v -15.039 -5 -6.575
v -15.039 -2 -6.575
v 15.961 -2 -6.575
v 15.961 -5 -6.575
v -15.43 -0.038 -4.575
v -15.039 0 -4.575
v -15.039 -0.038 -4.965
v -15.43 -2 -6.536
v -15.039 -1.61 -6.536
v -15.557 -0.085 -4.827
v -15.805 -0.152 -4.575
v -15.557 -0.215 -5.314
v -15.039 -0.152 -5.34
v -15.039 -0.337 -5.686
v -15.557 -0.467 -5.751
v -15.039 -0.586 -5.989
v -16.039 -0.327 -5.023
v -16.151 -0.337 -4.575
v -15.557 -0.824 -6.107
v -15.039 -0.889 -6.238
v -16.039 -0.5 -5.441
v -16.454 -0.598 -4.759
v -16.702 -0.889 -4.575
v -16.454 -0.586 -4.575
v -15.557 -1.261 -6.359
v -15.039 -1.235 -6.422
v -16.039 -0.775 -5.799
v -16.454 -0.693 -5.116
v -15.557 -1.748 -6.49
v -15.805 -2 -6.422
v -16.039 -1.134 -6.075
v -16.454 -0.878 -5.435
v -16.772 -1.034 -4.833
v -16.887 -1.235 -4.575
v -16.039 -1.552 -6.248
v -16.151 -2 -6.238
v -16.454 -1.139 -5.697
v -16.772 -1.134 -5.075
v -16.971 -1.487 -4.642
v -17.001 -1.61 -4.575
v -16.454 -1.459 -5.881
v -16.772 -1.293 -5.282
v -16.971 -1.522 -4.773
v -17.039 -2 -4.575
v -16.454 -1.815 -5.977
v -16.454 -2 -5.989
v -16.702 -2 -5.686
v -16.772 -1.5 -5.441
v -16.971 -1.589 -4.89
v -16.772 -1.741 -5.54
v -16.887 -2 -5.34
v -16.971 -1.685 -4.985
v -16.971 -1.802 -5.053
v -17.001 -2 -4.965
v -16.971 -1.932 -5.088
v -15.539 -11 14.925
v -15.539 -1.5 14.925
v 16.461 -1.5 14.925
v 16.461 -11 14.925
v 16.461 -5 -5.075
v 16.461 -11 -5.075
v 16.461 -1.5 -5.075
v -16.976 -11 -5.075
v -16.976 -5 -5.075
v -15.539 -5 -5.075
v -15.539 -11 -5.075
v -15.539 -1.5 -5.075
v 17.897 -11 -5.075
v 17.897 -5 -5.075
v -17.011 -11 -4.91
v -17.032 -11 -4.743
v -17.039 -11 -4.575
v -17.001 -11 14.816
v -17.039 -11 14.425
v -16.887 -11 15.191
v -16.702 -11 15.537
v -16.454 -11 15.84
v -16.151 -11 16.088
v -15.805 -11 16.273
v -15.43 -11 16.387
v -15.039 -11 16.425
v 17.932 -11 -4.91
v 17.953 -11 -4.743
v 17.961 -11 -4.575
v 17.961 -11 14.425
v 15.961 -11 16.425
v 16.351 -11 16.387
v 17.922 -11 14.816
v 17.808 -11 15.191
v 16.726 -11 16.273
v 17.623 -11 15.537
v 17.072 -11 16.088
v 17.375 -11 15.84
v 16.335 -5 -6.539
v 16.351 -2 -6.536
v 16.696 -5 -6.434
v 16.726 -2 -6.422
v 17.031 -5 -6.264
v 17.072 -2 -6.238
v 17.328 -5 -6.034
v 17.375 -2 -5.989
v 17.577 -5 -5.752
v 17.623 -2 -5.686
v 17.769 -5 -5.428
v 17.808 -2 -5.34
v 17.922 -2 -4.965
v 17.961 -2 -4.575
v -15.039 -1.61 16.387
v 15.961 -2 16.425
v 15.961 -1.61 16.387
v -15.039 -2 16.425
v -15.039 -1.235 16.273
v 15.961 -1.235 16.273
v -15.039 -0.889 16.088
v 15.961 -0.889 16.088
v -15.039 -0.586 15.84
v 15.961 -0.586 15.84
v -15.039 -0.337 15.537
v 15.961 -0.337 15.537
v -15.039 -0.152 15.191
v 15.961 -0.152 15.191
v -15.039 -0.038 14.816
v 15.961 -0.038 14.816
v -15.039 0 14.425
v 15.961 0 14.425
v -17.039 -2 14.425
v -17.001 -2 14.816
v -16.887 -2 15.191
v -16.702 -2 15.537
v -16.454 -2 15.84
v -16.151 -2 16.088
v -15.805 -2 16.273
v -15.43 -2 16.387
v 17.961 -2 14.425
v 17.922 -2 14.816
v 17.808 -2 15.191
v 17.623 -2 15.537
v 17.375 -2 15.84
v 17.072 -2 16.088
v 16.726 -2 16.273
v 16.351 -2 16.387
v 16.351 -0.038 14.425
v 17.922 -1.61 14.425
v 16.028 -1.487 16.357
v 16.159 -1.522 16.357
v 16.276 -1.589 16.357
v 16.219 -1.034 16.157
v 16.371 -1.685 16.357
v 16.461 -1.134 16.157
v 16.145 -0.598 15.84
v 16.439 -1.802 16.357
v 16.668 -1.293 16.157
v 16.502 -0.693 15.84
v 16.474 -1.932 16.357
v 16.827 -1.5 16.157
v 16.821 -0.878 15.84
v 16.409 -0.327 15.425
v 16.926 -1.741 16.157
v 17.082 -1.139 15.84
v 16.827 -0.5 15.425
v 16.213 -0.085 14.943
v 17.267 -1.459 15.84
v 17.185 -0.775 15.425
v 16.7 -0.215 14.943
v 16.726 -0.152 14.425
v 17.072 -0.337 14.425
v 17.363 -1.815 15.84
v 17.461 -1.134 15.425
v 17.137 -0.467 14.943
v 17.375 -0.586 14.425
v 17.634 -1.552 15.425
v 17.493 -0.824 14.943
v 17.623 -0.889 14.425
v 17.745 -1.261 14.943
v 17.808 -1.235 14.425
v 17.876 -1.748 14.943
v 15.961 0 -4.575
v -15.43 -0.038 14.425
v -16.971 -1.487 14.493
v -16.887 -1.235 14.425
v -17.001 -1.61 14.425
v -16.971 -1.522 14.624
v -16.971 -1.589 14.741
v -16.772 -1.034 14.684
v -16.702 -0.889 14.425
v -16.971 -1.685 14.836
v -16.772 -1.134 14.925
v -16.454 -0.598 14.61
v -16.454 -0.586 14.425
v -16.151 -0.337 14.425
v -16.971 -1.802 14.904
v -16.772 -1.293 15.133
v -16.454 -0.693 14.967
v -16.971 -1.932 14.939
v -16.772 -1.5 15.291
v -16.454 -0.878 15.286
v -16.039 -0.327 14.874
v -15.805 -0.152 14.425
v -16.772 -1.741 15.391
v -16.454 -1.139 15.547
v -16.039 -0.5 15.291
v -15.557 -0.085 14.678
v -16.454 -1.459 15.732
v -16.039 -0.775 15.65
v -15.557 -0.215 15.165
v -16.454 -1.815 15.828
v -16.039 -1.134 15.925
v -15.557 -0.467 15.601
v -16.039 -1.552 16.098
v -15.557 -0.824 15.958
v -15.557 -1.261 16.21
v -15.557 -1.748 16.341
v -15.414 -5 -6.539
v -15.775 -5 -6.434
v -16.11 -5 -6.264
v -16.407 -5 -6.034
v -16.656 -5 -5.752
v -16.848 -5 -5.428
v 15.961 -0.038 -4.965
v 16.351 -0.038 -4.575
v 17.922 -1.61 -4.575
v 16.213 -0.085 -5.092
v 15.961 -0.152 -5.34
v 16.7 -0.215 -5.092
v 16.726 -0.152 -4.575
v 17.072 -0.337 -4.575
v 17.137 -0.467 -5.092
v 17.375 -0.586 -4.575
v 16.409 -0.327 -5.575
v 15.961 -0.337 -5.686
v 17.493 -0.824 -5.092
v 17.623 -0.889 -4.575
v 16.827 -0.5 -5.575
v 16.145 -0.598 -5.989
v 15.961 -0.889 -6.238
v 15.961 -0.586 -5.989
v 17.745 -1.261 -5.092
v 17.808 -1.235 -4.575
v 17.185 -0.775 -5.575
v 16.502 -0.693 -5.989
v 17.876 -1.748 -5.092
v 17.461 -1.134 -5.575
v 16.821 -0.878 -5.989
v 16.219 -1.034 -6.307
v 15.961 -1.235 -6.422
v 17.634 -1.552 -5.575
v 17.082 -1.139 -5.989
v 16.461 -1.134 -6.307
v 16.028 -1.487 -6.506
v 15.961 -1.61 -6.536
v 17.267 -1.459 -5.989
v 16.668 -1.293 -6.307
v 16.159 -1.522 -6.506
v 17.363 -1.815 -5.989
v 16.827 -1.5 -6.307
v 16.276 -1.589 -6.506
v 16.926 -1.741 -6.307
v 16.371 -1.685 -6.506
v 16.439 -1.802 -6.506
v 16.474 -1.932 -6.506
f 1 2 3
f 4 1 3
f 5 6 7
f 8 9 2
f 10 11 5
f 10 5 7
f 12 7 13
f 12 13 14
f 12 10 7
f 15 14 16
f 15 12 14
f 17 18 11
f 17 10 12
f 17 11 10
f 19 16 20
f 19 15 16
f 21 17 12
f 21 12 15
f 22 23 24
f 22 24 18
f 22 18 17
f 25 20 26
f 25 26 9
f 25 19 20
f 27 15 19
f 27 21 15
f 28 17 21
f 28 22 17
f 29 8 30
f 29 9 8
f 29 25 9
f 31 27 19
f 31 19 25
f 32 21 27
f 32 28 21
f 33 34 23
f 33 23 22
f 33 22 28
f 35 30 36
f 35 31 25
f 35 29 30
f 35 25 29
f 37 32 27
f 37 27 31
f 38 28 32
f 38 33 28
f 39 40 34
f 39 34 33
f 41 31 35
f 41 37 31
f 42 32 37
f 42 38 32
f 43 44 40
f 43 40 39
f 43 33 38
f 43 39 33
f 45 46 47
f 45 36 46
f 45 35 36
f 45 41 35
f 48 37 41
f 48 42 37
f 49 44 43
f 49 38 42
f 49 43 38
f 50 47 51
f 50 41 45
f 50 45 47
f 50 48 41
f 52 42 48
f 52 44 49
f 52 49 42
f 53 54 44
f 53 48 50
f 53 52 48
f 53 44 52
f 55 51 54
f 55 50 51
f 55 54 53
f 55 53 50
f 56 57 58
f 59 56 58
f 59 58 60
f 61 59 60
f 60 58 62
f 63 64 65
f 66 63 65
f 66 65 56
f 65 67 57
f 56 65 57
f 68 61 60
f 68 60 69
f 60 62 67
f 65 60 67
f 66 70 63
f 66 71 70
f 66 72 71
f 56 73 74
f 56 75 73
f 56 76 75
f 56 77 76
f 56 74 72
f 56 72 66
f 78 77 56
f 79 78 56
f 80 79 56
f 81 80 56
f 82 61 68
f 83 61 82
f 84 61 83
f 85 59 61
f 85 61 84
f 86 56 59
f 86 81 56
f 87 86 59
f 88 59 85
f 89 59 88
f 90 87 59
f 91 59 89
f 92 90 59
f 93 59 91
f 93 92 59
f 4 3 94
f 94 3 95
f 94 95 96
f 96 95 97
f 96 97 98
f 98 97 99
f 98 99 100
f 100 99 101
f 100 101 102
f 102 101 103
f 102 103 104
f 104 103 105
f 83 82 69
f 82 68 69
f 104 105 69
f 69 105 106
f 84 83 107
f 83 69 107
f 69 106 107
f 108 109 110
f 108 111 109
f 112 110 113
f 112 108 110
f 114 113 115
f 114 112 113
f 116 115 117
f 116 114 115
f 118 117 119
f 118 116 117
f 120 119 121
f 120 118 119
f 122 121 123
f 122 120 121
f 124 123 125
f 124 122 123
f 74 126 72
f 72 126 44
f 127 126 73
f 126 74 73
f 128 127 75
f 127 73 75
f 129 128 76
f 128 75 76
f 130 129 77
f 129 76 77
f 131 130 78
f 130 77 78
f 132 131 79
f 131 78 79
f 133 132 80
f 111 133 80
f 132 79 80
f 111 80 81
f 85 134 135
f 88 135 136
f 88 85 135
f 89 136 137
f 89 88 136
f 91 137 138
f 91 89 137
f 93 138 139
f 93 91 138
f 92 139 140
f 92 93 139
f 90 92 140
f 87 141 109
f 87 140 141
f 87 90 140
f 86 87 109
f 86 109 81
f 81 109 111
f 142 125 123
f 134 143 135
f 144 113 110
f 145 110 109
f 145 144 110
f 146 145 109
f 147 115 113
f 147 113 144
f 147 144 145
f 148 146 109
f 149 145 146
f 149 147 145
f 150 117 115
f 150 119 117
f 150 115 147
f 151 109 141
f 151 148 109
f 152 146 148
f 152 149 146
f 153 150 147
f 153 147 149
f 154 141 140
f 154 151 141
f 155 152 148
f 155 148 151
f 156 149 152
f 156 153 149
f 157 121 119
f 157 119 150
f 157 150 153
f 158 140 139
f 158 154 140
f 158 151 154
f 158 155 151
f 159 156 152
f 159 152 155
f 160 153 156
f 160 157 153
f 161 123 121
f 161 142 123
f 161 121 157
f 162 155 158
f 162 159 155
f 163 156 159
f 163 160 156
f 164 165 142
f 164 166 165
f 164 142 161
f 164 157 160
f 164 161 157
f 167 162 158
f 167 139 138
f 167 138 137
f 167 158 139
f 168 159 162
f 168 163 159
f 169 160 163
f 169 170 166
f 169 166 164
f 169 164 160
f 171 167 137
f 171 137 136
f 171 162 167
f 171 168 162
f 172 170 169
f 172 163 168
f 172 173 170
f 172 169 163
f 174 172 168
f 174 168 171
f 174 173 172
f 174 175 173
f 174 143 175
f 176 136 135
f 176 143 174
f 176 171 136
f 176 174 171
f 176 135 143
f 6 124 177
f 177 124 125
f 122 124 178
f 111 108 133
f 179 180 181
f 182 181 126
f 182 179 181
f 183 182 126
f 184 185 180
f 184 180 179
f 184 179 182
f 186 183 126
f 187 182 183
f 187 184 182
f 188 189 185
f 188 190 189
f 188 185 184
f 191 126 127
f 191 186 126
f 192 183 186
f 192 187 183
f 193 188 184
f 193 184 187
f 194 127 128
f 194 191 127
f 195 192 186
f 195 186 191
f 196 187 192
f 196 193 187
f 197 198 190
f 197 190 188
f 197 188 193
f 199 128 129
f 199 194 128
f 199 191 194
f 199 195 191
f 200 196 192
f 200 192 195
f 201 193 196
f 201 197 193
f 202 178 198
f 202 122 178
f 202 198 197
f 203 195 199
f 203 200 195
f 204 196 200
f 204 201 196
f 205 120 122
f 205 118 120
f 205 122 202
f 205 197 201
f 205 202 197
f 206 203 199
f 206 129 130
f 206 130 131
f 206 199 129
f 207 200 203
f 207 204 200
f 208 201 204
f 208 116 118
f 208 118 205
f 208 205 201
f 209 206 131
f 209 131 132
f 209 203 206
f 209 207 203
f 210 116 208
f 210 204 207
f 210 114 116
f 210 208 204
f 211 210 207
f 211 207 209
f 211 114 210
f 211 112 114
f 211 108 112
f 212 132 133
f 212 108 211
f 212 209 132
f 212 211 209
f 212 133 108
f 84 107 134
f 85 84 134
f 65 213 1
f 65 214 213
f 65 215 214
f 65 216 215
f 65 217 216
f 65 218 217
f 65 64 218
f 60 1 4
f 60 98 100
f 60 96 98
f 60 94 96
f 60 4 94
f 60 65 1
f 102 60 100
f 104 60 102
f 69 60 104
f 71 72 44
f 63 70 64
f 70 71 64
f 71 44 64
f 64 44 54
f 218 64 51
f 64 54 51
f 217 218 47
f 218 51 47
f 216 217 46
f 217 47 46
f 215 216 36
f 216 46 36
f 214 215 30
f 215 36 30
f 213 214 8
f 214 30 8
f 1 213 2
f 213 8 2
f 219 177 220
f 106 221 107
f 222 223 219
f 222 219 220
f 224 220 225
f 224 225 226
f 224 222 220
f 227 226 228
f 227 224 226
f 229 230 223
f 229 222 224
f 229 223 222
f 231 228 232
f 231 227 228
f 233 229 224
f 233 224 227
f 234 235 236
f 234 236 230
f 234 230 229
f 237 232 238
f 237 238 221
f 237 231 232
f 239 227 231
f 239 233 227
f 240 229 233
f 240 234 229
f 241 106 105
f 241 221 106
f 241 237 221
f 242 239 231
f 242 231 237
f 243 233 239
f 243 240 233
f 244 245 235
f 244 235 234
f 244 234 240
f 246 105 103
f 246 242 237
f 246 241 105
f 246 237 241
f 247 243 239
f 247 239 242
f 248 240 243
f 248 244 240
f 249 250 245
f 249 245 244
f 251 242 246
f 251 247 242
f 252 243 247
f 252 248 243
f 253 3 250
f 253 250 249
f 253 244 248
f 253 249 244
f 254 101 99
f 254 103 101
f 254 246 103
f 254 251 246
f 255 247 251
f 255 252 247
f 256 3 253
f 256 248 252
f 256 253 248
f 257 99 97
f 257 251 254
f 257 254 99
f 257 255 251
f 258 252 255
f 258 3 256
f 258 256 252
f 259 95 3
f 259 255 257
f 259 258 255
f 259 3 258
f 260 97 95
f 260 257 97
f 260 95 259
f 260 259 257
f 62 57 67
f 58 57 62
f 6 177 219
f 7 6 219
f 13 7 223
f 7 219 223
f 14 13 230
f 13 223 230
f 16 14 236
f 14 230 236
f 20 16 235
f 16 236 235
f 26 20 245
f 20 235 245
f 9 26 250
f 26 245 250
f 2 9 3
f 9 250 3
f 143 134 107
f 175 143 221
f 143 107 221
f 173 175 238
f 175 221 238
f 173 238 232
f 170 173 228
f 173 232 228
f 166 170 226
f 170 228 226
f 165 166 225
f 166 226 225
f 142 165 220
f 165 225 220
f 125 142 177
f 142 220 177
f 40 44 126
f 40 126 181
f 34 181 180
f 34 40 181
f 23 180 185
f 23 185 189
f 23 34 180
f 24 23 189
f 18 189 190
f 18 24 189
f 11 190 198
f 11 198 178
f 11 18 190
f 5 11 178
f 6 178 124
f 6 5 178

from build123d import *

# Parameters (mm, degrees)
F0_W         = 32
F0_H         = 20
F1_DEPTH     = 1.5
F2_DEPTH     = 11
F3_DEPTH     = 5
F4_R         = 2
F5_T1_DEPTH  = 15
F5_S5_W      = 2.04
F5_S5_H      = 2.04
F5_T6_DEPTH  = 2.04
F5_S11_W     = 2.04
F5_S11_H     = 2.04
F5_T12_DEPTH = 2.04


# Not quite as in the source:
# - a fillet or chamfer that OpenCascade refuses, or shapes differently, is made with other operations: its cross-section is extruded or revolved along the edge and cut away or added


with BuildPart() as f1:
    # F0 (on Front) → F1 (new body)
    with BuildSketch(Plane.XZ):
        with Locations((0.460526906, 4.9254382253)):
            Rectangle(F0_W, F0_H)
    extrude(amount=F1_DEPTH)

    # F0 (on Front) → F2 (join)
    with BuildSketch(Plane.XZ):
        Polygon((-15.539473094, -5.0745617747), (-15.539473094, 14.9254382253), (16.460526906, 14.9254382253), (16.460526906, -5.0745617747), (17.960526906, -5.0745617747), (17.960526906, 16.4254382253), (-17.039473094, 16.4254382253), (-17.039473094, -5.0745617747), align=None)
    extrude(amount=F2_DEPTH)

    # F0 (on Front) → F3 (join)
    with BuildSketch(Plane.XZ):
        Polygon((16.460526906, -5.0745617747), (-15.539473094, -5.0745617747), (-17.039473094, -5.0745617747), (-17.039473094, -6.5745617747), (17.960526906, -6.5745617747), (17.960526906, -5.0745617747), align=None)
    extrude(amount=F3_DEPTH)

    # F4
    f4_edges = [f1.edges().sort_by_distance(p)[0] for p in [
        (17.960527, 0, 4.925438),
        (0.460527, 0, 16.425438),
        (-17.039473, 0, 4.925438),
        (0.460527, 0, -6.574562),
        (17.960527, -5.5, 16.425438),
        (-17.039473, -5.5, 16.425438),
    ]]
    fillet(f4_edges, radius=F4_R)

    # F5: fillet of radius 2 on 2 edges, made by hand

    # F5_s2 → F5_t1 (cut)
    with BuildSketch(Plane.XZ.offset(2)):
        with BuildLine():
            ThreePointArc((-17.039473094, -4.5745617747), (-16.4536866564, -5.9887753371), (-15.039473094, -6.5745617747))
            Line((-15.039473094, -6.5745617747), (-15.039473094, -6.6145617747))
            Line((-15.039473094, -6.6145617747), (-17.079473094, -6.6145617747))
            Line((-17.079473094, -6.6145617747), (-17.079473094, -4.5745617747))
            Line((-17.079473094, -4.5745617747), (-17.039473094, -4.5745617747))
        make_face()
        with BuildLine():
            ThreePointArc((15.960526906, -6.5745617747), (17.3747404683, -5.9887753371), (17.960526906, -4.5745617747))
            Line((17.960526906, -4.5745617747), (18.000526906, -4.5745617747))
            Line((18.000526906, -4.5745617747), (18.000526906, -6.6145617747))
            Line((18.000526906, -6.6145617747), (15.960526906, -6.6145617747))
            Line((15.960526906, -6.6145617747), (15.960526906, -6.5745617747))
        make_face()
    extrude(amount=F5_T1_DEPTH, mode=Mode.SUBTRACT)


with BuildPart() as f5_tool4:
    # F5_s5 → F5_t6 (new body)
    with BuildSketch(Plane.XY.offset(-4.5745617747)):
        with Locations((16.980526906, -0.98)):
            Rectangle(F5_S5_W, F5_S5_H)
    extrude(amount=-F5_T6_DEPTH)

    # F5_s7 → F5_t8 (revolve, cut)
    with BuildSketch(Plane(origin=(15.960526906, -2, -4.5745617747), x_dir=(-0.7071067812, -0.7071067812, 0), z_dir=(0.7071067812, -0.7071067812, 0))):
        with BuildLine():
            ThreePointArc((0, -2), (2, 0), (0, 2))
            Line((0, 2), (0, -2))
        make_face()
    revolve(axis=Axis((15.960526906, -2, -4.5745617747), (0, 0, -1)), mode=Mode.SUBTRACT)


with BuildPart() as f1_1:
    add(f1.part)

    # F5_t3: cut F5_tool4
    add(f5_tool4.part, mode=Mode.SUBTRACT)


with BuildPart() as f5_tool10:
    # F5_s11 → F5_t12 (new body)
    with BuildSketch(Plane.YZ.offset(-15.039473094)):
        with Locations((-0.98, -5.5945617747)):
            Rectangle(F5_S11_W, F5_S11_H)
    extrude(amount=-F5_T12_DEPTH)

    # F5_s13 → F5_t14 (revolve, cut)
    with BuildSketch(Plane(origin=(-15.039473094, -2, -4.5745617747), x_dir=(0, -0.7071067812, 0.7071067812), z_dir=(0, -0.7071067812, -0.7071067812))):
        with BuildLine():
            ThreePointArc((0, -2), (2, 0), (0, 2))
            Line((0, 2), (0, -2))
        make_face()
    revolve(axis=Axis((-15.039473094, -2, -4.5745617747), (-1, 0, 0)), mode=Mode.SUBTRACT)


with BuildPart() as f1_2:
    add(f1_1.part)

    # F5_t9: cut F5_tool10
    add(f5_tool10.part, mode=Mode.SUBTRACT)


solid = f1_2.part
